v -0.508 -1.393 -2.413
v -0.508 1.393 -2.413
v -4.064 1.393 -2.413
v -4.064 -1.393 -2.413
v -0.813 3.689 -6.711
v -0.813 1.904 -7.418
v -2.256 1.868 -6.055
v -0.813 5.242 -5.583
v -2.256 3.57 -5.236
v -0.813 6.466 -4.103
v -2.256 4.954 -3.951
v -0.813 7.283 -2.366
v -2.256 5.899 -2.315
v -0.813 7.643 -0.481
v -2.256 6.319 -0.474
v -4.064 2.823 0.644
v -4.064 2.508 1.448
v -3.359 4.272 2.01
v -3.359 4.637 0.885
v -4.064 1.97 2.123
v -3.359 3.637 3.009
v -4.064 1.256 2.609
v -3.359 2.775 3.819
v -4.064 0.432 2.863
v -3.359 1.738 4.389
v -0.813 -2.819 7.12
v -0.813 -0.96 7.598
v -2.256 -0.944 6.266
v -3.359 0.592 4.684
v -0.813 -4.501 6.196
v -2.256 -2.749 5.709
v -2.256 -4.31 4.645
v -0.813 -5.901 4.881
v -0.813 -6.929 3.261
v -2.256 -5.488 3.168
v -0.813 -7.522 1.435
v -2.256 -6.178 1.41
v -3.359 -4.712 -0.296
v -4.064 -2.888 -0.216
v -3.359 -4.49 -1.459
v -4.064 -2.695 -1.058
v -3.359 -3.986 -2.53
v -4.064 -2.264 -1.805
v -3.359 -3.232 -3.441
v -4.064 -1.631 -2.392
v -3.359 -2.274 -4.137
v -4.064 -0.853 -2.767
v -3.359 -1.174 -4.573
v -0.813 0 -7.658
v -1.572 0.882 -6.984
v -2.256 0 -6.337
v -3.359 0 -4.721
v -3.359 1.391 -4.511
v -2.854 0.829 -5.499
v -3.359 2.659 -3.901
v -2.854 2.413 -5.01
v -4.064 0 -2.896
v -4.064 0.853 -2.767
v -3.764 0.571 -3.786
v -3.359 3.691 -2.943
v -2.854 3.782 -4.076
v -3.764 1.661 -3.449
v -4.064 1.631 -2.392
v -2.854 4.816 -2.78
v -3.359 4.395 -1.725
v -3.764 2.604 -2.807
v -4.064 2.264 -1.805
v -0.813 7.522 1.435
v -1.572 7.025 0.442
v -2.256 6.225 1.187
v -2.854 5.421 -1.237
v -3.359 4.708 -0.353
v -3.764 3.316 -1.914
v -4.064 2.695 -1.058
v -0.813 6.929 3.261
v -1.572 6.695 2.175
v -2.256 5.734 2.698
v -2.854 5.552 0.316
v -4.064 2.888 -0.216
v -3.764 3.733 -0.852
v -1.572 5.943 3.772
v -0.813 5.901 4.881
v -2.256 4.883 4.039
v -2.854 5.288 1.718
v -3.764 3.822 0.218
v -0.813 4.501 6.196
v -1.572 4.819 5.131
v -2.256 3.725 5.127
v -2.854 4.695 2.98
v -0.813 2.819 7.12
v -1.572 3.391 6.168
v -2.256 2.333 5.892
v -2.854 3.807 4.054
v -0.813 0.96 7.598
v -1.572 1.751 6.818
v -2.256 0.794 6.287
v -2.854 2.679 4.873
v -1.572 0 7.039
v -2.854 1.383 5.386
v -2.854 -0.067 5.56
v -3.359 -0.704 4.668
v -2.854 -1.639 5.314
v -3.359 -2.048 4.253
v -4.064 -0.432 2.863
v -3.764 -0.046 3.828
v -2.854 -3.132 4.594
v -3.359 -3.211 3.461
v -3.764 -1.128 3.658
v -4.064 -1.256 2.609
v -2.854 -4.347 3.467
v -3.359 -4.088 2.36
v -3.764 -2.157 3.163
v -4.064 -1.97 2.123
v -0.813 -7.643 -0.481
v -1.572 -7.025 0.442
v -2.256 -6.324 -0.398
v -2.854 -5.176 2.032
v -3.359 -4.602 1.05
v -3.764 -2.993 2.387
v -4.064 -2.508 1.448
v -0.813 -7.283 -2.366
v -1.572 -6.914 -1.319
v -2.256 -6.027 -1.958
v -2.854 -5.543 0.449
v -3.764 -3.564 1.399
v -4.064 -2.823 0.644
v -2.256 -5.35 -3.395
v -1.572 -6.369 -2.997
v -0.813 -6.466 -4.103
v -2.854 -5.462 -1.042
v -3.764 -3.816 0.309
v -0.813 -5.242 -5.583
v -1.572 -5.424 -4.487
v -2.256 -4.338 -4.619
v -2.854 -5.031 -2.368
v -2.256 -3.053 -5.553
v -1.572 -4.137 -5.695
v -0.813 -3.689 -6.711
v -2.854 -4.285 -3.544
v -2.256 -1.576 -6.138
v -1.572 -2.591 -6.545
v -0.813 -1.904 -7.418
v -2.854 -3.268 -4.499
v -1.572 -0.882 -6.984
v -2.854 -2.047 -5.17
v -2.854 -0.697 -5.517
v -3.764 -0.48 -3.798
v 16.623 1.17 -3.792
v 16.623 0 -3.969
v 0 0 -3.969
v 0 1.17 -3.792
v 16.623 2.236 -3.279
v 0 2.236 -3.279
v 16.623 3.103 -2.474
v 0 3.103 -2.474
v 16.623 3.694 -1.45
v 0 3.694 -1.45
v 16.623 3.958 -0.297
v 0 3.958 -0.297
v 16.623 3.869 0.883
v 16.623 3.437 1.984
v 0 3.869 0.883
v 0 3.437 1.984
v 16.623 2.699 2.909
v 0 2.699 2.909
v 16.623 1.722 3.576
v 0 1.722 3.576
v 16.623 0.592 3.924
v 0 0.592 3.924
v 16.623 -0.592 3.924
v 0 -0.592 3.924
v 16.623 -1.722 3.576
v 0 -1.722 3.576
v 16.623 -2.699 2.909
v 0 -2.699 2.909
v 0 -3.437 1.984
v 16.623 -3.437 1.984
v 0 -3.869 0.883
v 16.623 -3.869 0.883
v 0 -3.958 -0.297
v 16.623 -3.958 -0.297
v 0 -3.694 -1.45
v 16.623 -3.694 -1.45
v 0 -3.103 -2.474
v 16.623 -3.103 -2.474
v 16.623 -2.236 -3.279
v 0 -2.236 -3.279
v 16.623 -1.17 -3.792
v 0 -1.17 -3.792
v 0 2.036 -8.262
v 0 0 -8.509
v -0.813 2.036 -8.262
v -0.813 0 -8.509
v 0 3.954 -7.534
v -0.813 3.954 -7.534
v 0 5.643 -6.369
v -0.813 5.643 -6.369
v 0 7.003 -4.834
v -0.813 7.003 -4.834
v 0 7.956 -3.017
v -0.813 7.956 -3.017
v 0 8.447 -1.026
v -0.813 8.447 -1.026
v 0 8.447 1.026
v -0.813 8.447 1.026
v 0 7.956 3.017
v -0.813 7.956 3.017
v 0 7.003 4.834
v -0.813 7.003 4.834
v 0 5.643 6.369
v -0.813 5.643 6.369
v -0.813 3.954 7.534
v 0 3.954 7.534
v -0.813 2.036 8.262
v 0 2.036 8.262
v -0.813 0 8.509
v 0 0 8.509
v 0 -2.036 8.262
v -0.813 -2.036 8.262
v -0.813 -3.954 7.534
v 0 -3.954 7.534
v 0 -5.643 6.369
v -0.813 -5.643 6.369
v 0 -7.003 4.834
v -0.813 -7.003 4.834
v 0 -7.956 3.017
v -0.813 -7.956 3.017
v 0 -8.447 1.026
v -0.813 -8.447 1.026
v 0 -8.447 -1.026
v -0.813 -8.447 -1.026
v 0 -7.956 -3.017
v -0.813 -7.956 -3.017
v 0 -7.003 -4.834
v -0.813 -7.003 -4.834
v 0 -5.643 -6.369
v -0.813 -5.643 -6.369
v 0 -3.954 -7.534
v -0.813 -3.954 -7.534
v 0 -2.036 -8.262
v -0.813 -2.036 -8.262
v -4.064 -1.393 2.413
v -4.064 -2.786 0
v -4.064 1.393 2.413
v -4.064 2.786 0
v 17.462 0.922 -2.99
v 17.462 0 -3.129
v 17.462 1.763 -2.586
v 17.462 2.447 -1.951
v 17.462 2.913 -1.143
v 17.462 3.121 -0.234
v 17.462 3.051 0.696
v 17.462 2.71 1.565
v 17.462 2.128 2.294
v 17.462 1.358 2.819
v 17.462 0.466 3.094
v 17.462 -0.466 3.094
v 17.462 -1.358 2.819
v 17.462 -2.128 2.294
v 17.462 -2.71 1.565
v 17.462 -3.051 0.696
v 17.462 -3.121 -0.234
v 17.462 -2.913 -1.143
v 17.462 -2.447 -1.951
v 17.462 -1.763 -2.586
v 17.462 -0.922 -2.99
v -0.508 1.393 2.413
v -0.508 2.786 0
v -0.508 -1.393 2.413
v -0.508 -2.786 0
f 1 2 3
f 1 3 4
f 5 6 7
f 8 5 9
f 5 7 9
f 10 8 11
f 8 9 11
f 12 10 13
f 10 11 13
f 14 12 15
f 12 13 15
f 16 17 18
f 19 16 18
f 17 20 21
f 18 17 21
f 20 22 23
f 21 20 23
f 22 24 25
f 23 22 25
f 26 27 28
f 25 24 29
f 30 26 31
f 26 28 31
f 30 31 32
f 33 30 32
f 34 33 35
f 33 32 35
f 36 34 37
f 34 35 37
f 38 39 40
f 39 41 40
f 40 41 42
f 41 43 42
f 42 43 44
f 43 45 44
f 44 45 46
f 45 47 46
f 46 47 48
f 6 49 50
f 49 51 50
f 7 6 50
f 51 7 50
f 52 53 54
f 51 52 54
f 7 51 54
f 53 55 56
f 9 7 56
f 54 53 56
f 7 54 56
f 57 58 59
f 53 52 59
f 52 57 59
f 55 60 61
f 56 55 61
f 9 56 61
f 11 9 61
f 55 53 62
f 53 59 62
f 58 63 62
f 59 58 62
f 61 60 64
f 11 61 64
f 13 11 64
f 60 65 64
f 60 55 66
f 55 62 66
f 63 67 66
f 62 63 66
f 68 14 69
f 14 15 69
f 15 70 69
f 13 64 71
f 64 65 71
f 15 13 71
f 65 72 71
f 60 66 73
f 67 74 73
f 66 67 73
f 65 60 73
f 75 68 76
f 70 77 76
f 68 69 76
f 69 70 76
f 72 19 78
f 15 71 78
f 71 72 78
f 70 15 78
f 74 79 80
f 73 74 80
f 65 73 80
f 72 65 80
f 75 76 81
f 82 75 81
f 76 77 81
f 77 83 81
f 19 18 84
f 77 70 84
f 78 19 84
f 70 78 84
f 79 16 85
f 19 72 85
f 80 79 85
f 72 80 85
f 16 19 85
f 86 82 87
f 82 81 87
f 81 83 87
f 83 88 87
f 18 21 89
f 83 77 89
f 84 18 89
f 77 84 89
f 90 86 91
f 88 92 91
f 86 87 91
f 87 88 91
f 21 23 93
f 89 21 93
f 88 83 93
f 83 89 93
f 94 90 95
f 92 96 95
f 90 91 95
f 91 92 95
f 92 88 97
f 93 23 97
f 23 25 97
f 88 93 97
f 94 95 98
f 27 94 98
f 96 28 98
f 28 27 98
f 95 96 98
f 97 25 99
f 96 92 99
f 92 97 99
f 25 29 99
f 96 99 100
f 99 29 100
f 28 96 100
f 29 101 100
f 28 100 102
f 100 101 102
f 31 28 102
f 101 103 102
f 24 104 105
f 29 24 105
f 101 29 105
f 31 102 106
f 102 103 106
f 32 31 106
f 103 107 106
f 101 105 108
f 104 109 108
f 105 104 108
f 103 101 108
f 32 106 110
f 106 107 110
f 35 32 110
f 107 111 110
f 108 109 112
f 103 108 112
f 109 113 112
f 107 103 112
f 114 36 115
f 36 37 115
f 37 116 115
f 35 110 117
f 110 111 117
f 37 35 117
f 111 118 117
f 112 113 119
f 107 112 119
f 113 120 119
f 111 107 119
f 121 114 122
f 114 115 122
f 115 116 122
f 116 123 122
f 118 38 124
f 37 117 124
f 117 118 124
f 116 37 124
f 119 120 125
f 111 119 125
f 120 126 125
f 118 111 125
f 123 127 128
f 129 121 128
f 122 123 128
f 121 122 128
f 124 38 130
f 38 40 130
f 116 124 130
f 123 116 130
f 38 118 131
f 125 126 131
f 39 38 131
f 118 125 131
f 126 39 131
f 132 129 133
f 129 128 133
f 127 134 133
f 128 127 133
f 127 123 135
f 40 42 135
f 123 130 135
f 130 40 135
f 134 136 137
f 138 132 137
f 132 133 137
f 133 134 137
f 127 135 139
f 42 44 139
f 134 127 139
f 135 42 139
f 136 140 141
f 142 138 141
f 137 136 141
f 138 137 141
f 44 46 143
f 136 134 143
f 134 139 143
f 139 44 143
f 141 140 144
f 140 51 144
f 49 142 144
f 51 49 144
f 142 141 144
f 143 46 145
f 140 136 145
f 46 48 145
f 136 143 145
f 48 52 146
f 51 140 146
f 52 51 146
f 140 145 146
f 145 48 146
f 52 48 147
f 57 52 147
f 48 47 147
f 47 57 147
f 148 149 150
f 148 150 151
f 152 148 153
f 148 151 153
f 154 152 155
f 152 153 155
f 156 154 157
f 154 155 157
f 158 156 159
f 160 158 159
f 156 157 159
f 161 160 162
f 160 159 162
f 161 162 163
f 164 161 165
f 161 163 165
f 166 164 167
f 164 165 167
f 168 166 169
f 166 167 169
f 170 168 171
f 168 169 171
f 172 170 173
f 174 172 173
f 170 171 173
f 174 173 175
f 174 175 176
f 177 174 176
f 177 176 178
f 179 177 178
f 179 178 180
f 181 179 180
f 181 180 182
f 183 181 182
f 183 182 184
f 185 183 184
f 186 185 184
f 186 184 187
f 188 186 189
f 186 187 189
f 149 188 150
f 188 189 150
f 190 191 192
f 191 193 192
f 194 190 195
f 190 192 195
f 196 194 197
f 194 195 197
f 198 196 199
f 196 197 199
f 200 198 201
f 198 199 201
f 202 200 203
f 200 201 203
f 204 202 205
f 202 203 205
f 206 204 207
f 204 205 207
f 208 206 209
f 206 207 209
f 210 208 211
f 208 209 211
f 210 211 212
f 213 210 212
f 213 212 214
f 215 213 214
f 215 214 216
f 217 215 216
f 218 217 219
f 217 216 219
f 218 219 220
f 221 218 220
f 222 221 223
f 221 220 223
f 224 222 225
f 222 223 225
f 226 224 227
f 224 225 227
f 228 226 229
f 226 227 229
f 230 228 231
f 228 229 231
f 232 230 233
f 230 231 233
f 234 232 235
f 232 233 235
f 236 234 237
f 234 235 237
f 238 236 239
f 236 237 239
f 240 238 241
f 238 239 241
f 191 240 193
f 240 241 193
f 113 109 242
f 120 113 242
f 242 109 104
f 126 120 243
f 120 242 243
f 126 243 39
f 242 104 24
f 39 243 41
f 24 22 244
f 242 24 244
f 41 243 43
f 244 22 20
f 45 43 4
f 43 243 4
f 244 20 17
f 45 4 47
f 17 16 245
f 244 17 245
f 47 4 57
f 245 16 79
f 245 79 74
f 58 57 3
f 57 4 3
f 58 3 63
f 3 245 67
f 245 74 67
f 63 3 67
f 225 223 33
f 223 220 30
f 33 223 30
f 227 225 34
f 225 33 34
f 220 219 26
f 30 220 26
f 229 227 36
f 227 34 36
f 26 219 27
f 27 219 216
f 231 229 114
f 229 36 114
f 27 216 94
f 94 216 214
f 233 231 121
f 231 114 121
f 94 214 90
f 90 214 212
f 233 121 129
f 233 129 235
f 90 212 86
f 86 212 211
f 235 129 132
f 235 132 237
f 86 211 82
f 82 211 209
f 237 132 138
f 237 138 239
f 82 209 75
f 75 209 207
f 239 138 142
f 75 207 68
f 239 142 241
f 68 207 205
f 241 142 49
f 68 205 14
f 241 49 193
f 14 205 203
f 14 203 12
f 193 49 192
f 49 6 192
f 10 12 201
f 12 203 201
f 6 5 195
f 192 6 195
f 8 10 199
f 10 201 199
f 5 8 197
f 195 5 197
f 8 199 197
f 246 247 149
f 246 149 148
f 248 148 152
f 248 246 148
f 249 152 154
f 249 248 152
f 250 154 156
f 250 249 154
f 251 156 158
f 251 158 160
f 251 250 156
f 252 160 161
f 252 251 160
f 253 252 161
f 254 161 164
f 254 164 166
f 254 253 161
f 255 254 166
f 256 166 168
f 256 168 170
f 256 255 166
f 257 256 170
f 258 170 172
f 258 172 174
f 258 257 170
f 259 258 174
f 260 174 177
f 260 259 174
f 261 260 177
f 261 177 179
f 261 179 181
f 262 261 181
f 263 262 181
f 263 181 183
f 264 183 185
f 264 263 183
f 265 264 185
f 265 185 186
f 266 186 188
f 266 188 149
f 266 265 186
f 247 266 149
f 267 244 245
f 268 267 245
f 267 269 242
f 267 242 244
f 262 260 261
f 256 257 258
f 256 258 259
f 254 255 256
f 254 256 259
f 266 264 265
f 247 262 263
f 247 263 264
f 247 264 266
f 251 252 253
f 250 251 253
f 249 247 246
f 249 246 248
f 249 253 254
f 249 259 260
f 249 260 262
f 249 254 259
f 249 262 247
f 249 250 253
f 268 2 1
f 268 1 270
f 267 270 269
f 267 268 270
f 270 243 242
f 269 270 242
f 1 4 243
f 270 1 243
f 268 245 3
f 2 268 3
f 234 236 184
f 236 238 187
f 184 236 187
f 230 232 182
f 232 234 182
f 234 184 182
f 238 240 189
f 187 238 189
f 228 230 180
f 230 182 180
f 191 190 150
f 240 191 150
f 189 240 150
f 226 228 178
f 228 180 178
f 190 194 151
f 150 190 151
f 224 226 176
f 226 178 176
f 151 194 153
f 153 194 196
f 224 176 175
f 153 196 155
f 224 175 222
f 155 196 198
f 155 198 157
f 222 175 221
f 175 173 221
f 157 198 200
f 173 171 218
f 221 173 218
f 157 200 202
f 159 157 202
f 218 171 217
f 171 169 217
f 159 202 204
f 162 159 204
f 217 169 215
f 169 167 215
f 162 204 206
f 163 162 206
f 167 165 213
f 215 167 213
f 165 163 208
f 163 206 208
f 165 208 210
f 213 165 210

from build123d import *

# Parameters (mm, degrees)
SKETCH2_R           = 3.96875
BOSS_EXTRUDE1_DEPTH = 17.4625
CUT_EXTRUDE1_DEPTH  = 3.556
CHAMFER1_SIZE       = 0.83947


with BuildPart() as part:
    # Sketch1 → Revolve1 (revolve)
    with BuildSketch(Plane.XY, mode=Mode.PRIVATE) as revolve1_sk:
        with BuildLine():
            Line((-4.064, 2.8956), (-4.064, 0))
            Line((-4.064, 0), (0, 0))
            Line((0, 0), (0, 8.509))
            Line((0, 8.509), (-0.8128, 8.509))
            Line((-0.8128, 8.509), (-0.8128, 7.6581))
            ThreePointArc((-0.8128, 7.6581), (-2.854131619, 5.560656119), (-4.064, 2.8956))
        make_face()
    revolve(revolve1_sk.sketch.rotate(Axis((-4.064, 0, 0), (1, 0, 0)), 270), axis=Axis((-4.064, 0, 0), (1, 0, 0)))

    # Sketch2 → Boss-Extrude1 (add)
    with BuildSketch(Plane(origin=(0, 0, 0), x_dir=(0, 0, -1), z_dir=(1, 0, 0))):
        Circle(SKETCH2_R)
    extrude(amount=BOSS_EXTRUDE1_DEPTH)

    # Sketch3 → Cut-Extrude1 (cut)
    with BuildSketch(Plane.ZY.offset(4.064)):
        Polygon((0, -2.786292399), (2.413, -1.3931462), (2.413, 1.3931462), (0, 2.786292399), (-2.413, 1.3931462), (-2.413, -1.3931462), align=None)
    extrude(amount=-CUT_EXTRUDE1_DEPTH, mode=Mode.SUBTRACT)

    # Chamfer1
    chamfer1_edges = [part.edges().sort_by_distance(p)[0] for p in [
        (17.4625, 0, 3.96875),
    ]]
    chamfer(chamfer1_edges, length=CHAMFER1_SIZE)


solid = part.part
